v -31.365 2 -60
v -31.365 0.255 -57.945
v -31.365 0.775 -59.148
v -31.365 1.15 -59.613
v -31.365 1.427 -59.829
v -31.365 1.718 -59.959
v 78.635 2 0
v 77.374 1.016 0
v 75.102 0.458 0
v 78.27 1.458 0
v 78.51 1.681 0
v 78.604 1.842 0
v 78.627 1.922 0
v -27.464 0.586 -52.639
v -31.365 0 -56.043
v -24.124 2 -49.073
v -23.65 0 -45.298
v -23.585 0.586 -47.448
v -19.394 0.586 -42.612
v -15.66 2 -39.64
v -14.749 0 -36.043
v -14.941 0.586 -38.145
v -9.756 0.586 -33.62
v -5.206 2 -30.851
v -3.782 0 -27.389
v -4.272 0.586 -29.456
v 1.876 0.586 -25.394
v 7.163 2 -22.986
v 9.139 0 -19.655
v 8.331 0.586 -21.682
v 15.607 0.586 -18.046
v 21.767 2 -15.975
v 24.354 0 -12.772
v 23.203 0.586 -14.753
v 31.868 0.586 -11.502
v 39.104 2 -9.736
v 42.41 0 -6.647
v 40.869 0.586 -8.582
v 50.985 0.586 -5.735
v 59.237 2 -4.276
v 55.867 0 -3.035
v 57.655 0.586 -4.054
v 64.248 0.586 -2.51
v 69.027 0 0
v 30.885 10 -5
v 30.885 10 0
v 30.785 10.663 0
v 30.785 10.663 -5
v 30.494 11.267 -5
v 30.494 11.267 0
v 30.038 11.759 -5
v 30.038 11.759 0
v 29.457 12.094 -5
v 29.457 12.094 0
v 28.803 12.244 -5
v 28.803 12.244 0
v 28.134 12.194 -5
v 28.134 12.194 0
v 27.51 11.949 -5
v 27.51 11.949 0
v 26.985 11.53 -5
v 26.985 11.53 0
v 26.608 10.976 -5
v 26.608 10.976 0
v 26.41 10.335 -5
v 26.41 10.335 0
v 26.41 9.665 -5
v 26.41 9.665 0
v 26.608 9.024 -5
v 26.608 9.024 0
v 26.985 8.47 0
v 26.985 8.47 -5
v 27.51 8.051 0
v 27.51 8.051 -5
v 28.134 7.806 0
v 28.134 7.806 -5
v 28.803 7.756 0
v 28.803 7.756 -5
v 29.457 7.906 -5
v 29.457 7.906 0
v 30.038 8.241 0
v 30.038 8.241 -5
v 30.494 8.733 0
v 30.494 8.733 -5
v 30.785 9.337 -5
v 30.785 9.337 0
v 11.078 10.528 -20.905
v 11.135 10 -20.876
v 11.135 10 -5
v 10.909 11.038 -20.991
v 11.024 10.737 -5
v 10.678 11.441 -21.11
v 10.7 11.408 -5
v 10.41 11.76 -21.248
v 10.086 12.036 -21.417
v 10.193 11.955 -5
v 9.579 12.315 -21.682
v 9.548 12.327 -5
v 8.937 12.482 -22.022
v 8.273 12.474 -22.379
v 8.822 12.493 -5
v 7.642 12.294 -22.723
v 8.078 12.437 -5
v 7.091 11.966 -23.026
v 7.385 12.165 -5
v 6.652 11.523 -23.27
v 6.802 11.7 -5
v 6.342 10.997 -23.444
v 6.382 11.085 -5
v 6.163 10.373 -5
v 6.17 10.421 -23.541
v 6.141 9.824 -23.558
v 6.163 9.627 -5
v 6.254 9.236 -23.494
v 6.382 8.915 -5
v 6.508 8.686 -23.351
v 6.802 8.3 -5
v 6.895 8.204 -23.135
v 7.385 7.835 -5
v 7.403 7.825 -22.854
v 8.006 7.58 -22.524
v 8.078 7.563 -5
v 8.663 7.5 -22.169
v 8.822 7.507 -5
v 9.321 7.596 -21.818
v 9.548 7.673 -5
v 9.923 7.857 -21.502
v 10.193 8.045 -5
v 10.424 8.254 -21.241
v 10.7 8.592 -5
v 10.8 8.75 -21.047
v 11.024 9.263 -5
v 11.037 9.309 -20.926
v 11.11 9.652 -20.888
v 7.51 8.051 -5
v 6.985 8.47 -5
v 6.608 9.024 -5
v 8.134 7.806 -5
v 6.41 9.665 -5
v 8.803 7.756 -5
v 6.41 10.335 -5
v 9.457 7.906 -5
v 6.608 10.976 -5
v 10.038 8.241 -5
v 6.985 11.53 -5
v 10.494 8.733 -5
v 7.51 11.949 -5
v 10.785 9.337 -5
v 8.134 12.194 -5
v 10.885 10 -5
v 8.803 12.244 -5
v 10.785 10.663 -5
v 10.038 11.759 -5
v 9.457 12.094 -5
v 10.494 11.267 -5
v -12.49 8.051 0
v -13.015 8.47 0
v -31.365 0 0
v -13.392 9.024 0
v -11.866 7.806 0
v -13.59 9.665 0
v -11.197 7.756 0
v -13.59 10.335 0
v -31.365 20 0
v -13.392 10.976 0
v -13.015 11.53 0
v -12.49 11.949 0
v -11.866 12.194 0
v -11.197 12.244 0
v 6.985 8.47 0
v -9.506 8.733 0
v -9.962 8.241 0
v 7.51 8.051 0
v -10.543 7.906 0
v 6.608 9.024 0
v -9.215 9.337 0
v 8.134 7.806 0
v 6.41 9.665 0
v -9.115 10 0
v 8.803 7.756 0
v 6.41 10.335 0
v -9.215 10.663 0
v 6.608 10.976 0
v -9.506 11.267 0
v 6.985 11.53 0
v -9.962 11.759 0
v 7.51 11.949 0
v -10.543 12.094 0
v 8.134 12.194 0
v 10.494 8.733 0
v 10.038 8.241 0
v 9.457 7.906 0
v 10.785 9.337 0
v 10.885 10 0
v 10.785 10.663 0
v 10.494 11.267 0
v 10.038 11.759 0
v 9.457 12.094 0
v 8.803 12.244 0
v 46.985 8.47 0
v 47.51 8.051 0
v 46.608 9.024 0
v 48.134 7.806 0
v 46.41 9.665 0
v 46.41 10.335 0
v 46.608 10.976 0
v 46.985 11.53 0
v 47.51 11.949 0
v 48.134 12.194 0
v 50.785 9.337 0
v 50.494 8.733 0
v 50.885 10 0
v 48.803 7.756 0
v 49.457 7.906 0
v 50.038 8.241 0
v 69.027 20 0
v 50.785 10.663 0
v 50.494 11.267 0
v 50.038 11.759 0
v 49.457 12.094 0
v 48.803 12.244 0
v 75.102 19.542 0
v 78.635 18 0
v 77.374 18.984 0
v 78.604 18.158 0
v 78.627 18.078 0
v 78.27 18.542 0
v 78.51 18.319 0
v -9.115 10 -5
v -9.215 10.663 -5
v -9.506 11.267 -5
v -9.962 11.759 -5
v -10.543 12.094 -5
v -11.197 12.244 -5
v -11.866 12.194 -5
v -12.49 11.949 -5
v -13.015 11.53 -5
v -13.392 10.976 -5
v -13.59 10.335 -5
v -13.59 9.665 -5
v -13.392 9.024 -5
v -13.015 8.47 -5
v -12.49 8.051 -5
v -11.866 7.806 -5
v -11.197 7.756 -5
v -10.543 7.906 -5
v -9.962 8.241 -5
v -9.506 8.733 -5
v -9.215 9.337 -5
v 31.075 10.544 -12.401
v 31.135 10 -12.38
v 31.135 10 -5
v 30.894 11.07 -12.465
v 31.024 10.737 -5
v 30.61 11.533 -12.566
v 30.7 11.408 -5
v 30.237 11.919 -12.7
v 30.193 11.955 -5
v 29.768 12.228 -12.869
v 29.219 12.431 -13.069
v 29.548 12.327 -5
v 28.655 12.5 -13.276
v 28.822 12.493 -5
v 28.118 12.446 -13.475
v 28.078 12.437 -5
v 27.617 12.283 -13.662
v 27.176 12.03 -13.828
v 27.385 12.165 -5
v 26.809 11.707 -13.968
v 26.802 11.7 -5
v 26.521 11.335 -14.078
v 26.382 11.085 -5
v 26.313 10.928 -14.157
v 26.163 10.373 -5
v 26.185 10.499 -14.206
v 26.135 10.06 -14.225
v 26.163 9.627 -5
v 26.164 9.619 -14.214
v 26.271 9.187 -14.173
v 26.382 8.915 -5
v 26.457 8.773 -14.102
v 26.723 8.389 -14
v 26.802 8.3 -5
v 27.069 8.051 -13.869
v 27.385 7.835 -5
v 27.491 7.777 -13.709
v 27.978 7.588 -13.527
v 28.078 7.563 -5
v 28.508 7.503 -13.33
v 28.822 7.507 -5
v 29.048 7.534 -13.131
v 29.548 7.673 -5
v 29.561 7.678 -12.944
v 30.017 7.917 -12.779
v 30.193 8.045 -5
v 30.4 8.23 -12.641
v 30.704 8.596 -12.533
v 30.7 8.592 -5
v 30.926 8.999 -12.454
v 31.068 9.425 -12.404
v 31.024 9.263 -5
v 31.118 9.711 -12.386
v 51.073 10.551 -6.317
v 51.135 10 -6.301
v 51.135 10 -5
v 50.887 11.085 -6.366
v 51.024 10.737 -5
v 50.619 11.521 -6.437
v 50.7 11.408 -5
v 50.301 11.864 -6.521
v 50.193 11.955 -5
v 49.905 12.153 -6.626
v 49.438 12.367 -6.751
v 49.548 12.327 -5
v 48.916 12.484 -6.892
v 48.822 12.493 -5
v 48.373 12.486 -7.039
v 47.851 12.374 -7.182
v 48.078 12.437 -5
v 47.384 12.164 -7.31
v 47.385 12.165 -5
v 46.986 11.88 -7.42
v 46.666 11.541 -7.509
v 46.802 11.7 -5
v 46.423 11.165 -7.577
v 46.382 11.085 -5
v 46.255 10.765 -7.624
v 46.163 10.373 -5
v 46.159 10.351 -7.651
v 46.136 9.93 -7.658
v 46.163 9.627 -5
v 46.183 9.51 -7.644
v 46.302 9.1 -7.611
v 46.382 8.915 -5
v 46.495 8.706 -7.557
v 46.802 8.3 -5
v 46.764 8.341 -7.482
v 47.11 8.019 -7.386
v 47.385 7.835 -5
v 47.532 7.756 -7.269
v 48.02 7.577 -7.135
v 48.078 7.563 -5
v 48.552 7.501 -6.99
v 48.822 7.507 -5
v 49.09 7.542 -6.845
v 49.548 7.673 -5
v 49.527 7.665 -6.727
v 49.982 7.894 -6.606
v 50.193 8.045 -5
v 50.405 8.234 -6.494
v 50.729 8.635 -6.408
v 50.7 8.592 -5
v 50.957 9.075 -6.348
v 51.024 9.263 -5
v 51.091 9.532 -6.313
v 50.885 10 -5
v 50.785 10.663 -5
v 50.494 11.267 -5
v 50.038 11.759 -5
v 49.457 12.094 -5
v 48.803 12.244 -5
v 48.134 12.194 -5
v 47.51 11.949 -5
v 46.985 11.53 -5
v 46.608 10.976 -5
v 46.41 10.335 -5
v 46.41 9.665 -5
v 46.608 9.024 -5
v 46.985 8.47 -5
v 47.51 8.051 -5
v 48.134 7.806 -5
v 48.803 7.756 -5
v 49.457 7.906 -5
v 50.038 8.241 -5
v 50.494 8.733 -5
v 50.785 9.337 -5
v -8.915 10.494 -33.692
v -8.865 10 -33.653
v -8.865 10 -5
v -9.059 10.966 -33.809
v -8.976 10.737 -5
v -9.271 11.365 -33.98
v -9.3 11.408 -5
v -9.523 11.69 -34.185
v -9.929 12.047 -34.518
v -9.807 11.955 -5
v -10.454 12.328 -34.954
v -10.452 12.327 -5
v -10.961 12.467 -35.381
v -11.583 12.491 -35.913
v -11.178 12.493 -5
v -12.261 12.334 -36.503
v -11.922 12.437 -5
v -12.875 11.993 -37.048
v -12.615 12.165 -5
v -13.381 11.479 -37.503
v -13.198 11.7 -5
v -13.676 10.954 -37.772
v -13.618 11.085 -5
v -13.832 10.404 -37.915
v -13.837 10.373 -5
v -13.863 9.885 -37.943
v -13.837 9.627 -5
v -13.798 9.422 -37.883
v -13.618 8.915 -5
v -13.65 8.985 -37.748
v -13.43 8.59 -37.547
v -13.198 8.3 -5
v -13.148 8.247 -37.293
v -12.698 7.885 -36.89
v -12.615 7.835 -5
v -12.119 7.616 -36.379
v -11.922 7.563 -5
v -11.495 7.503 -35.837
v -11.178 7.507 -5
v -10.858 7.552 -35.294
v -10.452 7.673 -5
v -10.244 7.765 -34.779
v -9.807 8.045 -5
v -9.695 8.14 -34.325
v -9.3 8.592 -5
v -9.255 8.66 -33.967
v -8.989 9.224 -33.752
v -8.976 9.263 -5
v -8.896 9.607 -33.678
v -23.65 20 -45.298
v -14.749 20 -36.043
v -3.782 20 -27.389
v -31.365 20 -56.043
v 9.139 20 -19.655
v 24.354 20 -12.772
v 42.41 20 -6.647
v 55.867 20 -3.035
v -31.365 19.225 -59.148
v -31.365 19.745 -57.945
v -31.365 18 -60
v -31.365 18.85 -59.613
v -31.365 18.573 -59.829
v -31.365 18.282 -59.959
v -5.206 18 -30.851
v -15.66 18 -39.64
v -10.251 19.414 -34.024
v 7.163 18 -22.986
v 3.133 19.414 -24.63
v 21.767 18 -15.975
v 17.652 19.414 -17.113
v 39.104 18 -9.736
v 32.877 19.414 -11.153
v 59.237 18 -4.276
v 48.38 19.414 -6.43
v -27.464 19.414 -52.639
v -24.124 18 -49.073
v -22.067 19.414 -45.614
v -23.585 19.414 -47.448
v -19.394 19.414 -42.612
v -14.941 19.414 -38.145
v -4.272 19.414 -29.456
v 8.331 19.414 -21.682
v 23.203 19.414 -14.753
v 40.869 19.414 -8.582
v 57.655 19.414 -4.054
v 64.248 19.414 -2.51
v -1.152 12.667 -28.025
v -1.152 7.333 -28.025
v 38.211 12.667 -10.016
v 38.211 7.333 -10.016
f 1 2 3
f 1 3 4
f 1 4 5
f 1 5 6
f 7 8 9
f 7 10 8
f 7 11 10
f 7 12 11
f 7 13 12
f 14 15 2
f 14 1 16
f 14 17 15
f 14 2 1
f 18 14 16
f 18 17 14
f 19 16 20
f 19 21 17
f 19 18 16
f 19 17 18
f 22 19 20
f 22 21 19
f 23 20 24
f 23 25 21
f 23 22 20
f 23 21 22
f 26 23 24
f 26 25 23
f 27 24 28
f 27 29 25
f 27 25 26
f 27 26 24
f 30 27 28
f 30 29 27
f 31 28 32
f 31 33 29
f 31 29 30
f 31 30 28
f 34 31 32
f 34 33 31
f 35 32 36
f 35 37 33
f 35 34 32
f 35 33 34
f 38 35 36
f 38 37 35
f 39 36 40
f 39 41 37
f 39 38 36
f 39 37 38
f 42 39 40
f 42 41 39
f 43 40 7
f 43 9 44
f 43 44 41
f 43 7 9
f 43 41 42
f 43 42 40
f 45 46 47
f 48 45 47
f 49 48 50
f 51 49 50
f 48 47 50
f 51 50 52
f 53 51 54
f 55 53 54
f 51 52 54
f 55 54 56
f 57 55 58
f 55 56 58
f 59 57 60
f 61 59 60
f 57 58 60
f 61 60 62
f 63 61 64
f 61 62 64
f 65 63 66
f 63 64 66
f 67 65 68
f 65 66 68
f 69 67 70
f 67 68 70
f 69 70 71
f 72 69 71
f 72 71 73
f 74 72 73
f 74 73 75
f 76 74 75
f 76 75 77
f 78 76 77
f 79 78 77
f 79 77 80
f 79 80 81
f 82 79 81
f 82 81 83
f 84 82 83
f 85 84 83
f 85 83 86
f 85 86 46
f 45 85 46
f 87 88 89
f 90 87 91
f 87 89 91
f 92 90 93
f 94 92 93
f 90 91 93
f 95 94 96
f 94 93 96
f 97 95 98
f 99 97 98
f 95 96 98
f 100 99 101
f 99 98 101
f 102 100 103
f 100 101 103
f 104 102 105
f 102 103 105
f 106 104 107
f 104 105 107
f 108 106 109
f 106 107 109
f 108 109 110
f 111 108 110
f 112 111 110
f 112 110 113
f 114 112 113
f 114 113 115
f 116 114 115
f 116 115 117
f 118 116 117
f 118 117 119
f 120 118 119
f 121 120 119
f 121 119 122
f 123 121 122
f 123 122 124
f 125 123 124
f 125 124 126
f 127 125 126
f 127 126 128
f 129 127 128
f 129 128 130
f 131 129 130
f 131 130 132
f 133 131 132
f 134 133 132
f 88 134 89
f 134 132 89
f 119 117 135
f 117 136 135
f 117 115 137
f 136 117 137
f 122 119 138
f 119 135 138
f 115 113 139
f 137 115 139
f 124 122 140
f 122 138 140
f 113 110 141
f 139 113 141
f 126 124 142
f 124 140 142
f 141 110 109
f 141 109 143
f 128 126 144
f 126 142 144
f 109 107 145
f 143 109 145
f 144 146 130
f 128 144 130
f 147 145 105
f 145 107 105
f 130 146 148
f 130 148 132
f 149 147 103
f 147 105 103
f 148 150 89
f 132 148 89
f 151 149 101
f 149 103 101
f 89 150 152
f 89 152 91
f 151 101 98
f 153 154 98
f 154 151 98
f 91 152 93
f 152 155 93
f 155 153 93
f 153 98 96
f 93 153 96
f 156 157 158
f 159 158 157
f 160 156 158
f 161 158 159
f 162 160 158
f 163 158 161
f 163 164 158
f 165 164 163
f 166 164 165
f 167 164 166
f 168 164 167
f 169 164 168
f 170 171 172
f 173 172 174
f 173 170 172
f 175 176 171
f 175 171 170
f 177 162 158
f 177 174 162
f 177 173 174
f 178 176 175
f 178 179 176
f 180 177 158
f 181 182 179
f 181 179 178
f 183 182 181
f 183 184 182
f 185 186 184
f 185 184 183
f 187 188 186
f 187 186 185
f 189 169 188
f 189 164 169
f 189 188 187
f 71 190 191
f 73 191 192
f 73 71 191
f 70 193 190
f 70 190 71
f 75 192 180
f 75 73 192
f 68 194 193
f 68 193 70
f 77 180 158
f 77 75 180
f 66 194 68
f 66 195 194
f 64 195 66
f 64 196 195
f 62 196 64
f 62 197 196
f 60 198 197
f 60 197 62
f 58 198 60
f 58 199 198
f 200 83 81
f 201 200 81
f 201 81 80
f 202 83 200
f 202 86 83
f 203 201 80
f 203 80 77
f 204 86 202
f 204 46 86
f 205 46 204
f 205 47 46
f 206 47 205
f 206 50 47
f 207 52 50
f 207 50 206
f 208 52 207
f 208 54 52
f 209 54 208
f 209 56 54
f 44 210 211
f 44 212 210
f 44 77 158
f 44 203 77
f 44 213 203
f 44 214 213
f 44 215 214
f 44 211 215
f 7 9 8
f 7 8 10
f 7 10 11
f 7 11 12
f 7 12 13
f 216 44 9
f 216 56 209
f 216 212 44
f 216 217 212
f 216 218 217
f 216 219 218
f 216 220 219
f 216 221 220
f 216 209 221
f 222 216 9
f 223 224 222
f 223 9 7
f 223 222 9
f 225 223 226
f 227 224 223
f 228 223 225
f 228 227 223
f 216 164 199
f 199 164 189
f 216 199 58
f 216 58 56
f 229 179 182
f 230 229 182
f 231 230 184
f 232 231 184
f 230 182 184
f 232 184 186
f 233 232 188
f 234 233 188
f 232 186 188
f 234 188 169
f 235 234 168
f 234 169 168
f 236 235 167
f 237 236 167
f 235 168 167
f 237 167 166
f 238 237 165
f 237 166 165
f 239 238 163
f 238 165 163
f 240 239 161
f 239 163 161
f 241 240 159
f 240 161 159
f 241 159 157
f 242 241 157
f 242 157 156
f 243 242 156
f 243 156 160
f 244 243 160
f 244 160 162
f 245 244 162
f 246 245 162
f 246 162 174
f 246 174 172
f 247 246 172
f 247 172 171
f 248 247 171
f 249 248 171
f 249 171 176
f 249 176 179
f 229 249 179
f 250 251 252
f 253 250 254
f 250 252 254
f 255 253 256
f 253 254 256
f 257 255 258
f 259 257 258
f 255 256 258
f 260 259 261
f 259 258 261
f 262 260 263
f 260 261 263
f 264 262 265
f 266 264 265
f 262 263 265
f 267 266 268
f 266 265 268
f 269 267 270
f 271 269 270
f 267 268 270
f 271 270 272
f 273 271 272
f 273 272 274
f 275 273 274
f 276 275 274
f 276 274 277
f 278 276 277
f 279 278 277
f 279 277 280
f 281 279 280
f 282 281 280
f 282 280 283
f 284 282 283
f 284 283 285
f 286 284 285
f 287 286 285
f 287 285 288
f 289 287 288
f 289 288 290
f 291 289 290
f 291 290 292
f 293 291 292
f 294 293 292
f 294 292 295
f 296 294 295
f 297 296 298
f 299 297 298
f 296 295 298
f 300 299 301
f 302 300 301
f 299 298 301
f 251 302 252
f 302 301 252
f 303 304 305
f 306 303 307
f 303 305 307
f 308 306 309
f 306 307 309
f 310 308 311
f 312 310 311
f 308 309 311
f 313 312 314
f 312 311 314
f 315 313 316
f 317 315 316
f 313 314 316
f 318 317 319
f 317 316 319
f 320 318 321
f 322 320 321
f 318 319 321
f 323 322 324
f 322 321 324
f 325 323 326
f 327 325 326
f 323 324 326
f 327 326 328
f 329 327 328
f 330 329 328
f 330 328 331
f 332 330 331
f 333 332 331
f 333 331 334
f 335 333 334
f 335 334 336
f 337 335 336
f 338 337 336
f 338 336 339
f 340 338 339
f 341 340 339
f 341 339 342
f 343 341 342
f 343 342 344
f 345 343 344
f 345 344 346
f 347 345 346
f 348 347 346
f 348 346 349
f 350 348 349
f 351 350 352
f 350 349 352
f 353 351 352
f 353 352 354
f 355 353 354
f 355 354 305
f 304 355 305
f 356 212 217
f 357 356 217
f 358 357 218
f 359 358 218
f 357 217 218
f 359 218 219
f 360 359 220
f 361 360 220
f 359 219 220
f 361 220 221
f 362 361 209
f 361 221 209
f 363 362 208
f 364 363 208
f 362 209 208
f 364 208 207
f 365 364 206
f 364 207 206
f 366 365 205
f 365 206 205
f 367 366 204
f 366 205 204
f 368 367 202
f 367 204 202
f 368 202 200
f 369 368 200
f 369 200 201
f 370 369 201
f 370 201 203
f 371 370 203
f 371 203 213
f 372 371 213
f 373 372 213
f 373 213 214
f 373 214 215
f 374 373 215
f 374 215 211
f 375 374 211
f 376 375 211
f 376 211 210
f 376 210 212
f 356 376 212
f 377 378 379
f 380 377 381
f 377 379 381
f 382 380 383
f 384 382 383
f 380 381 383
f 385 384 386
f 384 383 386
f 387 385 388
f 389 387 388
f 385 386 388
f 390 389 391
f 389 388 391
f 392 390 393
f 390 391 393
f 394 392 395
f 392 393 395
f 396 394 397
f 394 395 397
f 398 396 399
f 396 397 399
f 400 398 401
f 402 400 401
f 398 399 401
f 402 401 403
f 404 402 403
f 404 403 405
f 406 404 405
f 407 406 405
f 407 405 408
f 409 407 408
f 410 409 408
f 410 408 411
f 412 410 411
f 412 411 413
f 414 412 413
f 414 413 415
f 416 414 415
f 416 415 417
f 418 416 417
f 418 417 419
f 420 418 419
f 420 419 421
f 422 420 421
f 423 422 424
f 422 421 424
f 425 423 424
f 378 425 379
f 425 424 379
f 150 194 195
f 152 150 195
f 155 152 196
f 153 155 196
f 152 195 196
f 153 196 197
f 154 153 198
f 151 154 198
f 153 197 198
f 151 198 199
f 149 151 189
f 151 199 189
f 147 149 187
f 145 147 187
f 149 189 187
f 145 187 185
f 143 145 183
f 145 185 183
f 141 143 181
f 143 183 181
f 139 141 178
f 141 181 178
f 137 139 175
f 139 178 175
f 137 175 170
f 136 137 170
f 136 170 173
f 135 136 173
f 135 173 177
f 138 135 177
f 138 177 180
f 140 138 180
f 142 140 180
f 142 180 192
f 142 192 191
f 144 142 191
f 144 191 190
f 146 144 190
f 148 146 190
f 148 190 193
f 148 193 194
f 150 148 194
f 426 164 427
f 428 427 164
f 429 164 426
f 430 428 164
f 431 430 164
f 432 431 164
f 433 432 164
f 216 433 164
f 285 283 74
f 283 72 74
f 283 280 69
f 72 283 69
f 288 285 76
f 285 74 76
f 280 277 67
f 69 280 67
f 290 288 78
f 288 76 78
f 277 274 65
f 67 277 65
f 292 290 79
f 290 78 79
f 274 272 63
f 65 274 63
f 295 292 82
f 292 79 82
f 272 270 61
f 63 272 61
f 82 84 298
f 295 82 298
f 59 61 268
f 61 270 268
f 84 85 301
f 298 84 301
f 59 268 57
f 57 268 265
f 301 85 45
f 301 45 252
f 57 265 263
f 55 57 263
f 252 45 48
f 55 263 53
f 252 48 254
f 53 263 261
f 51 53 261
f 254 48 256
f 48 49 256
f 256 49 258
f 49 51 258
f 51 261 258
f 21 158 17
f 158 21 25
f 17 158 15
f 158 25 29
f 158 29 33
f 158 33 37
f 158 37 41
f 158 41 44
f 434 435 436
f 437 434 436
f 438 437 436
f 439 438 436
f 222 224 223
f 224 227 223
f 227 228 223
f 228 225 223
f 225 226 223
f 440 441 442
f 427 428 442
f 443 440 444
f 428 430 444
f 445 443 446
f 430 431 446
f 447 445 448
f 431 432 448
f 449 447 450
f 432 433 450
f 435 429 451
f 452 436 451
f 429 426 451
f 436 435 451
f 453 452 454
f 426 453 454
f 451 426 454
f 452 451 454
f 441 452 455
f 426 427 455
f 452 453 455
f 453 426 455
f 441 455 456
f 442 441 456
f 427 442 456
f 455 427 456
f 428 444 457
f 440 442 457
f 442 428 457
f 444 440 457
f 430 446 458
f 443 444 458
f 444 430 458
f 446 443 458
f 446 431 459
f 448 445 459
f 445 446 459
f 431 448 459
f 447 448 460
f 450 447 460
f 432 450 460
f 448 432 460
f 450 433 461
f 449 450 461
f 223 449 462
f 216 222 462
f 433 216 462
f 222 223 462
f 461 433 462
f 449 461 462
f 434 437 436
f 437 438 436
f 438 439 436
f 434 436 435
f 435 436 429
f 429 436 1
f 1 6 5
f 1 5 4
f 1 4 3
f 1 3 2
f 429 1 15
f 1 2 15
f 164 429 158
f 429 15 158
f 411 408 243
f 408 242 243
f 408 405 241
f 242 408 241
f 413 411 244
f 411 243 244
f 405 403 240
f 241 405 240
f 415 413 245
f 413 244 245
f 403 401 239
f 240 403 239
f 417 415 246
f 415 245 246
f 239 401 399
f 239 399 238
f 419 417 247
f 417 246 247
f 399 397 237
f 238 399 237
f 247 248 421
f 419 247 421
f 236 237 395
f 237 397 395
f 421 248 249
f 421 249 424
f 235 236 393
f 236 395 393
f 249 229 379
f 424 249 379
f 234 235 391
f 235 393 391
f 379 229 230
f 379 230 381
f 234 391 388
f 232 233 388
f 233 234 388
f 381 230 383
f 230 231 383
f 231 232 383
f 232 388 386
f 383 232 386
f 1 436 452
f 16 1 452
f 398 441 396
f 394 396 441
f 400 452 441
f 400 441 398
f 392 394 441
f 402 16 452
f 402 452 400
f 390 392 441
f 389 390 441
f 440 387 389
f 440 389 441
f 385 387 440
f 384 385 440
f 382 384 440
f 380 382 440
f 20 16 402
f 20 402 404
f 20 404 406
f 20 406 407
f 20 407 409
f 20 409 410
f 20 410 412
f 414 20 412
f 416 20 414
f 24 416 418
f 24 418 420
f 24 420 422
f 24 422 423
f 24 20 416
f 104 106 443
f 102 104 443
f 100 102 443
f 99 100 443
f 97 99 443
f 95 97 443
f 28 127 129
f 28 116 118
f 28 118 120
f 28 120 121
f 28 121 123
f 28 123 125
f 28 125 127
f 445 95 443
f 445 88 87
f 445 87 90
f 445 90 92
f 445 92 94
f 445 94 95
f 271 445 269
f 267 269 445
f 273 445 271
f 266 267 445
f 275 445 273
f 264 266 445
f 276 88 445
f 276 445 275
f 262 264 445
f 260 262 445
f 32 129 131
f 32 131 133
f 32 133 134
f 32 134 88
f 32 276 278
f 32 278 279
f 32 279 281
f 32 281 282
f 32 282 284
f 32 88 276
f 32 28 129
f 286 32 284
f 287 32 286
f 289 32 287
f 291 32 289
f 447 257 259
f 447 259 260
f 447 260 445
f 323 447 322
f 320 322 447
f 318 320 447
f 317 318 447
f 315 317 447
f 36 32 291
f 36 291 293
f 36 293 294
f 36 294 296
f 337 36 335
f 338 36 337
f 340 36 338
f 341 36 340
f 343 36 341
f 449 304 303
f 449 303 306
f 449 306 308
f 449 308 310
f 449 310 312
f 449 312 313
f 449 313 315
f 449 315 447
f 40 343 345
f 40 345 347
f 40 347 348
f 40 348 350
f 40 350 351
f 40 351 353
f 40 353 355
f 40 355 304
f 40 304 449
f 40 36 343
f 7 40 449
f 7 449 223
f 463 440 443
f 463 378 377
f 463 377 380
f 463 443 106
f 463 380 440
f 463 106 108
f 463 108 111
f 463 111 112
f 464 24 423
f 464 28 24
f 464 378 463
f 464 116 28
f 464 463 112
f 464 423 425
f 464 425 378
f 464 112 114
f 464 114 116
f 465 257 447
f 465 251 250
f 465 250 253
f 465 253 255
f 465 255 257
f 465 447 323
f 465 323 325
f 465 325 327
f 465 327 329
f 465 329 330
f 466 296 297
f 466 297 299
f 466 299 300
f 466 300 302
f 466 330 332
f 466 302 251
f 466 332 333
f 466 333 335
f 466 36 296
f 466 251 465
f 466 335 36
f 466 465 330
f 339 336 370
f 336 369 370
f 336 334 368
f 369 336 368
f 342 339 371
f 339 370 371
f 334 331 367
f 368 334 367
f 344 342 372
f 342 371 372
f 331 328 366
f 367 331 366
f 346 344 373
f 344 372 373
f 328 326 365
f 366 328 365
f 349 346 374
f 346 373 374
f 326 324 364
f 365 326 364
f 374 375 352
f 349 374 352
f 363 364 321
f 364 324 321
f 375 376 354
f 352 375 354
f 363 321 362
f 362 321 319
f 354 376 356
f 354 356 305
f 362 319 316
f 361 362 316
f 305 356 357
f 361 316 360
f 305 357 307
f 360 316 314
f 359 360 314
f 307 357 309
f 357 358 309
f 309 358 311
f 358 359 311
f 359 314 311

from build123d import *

# Parameters (mm, degrees)
BOSS_EXTRUDE1_DEPTH = 20
SKETCH3_R           = 2.5
CUT_EXTRUDE1_DEPTH  = 101.912910248
SKETCH4_R           = 2.5
BOSS_EXTRUDE2_DEPTH = 5
SKETCH5_R           = 2.25
CUT_EXTRUDE2_DEPTH  = 101.912910248
FILLET2_R           = 2


with BuildPart() as part:
    # Sketch2 → Boss-Extrude1 (new body)
    with BuildSketch(Plane(origin=(0, 0, 0), x_dir=(1, 0, 0), z_dir=(0, 1, 0))):
        with BuildLine():
            Line((-31.365303949, 0), (78.634696051, 0))
            add(Edge.make_bspline(
                [(-31.365303949, 60), (-8.421867165, 19.05257491), (40.3762891, 8.008963313), (78.634696051, 0)],
                knots=[0, 0, 0, 0, 1, 1, 1, 1], degree=3))
            Line((-31.365303949, 60), (-31.365303949, 0))
        make_face()
    extrude(amount=BOSS_EXTRUDE1_DEPTH)

    # Sketch3 → Cut-Extrude1 (cut, through all)
    with BuildSketch(Plane.XY):
        with Locations((-11.365303949, 10)):
            Circle(SKETCH3_R)
        with Locations((8.634696051, 10)):
            Circle(SKETCH3_R)
        with Locations((28.634696051, 10)):
            Circle(SKETCH3_R)
        with Locations((48.634696051, 10)):
            Circle(SKETCH3_R)
    extrude(amount=-CUT_EXTRUDE1_DEPTH, mode=Mode.SUBTRACT)

    # Sketch4 → Boss-Extrude2 (add)
    with BuildSketch(Plane.XY):
        with Locations((-11.365303949, 10)):
            Circle(SKETCH4_R)
        with Locations((8.634696051, 10)):
            Circle(SKETCH4_R)
        with Locations((28.634696051, 10)):
            Circle(SKETCH4_R)
        with Locations((48.634696051, 10)):
            Circle(SKETCH4_R)
    extrude(amount=-BOSS_EXTRUDE2_DEPTH)

    # Sketch5 → Cut-Extrude2 (cut, through all)
    with BuildSketch(Plane.XY):
        with Locations((-11.365303949, 10)):
            Circle(SKETCH5_R)
        with Locations((8.634696051, 10)):
            Circle(SKETCH5_R)
        with Locations((28.634696051, 10)):
            Circle(SKETCH5_R)
        with Locations((48.634696051, 10)):
            Circle(SKETCH5_R)
    extrude(amount=-CUT_EXTRUDE2_DEPTH, mode=Mode.SUBTRACT)

    # Fillet2
    fillet2_edges = [part.edges().sort_by_distance(p)[0] for p in [
        (16.640660288, 20, -18.214380109),
        (16.640660288, 0, -18.214380109),
    ]]
    fillet(fillet2_edges, radius=FILLET2_R)


solid = part.part
